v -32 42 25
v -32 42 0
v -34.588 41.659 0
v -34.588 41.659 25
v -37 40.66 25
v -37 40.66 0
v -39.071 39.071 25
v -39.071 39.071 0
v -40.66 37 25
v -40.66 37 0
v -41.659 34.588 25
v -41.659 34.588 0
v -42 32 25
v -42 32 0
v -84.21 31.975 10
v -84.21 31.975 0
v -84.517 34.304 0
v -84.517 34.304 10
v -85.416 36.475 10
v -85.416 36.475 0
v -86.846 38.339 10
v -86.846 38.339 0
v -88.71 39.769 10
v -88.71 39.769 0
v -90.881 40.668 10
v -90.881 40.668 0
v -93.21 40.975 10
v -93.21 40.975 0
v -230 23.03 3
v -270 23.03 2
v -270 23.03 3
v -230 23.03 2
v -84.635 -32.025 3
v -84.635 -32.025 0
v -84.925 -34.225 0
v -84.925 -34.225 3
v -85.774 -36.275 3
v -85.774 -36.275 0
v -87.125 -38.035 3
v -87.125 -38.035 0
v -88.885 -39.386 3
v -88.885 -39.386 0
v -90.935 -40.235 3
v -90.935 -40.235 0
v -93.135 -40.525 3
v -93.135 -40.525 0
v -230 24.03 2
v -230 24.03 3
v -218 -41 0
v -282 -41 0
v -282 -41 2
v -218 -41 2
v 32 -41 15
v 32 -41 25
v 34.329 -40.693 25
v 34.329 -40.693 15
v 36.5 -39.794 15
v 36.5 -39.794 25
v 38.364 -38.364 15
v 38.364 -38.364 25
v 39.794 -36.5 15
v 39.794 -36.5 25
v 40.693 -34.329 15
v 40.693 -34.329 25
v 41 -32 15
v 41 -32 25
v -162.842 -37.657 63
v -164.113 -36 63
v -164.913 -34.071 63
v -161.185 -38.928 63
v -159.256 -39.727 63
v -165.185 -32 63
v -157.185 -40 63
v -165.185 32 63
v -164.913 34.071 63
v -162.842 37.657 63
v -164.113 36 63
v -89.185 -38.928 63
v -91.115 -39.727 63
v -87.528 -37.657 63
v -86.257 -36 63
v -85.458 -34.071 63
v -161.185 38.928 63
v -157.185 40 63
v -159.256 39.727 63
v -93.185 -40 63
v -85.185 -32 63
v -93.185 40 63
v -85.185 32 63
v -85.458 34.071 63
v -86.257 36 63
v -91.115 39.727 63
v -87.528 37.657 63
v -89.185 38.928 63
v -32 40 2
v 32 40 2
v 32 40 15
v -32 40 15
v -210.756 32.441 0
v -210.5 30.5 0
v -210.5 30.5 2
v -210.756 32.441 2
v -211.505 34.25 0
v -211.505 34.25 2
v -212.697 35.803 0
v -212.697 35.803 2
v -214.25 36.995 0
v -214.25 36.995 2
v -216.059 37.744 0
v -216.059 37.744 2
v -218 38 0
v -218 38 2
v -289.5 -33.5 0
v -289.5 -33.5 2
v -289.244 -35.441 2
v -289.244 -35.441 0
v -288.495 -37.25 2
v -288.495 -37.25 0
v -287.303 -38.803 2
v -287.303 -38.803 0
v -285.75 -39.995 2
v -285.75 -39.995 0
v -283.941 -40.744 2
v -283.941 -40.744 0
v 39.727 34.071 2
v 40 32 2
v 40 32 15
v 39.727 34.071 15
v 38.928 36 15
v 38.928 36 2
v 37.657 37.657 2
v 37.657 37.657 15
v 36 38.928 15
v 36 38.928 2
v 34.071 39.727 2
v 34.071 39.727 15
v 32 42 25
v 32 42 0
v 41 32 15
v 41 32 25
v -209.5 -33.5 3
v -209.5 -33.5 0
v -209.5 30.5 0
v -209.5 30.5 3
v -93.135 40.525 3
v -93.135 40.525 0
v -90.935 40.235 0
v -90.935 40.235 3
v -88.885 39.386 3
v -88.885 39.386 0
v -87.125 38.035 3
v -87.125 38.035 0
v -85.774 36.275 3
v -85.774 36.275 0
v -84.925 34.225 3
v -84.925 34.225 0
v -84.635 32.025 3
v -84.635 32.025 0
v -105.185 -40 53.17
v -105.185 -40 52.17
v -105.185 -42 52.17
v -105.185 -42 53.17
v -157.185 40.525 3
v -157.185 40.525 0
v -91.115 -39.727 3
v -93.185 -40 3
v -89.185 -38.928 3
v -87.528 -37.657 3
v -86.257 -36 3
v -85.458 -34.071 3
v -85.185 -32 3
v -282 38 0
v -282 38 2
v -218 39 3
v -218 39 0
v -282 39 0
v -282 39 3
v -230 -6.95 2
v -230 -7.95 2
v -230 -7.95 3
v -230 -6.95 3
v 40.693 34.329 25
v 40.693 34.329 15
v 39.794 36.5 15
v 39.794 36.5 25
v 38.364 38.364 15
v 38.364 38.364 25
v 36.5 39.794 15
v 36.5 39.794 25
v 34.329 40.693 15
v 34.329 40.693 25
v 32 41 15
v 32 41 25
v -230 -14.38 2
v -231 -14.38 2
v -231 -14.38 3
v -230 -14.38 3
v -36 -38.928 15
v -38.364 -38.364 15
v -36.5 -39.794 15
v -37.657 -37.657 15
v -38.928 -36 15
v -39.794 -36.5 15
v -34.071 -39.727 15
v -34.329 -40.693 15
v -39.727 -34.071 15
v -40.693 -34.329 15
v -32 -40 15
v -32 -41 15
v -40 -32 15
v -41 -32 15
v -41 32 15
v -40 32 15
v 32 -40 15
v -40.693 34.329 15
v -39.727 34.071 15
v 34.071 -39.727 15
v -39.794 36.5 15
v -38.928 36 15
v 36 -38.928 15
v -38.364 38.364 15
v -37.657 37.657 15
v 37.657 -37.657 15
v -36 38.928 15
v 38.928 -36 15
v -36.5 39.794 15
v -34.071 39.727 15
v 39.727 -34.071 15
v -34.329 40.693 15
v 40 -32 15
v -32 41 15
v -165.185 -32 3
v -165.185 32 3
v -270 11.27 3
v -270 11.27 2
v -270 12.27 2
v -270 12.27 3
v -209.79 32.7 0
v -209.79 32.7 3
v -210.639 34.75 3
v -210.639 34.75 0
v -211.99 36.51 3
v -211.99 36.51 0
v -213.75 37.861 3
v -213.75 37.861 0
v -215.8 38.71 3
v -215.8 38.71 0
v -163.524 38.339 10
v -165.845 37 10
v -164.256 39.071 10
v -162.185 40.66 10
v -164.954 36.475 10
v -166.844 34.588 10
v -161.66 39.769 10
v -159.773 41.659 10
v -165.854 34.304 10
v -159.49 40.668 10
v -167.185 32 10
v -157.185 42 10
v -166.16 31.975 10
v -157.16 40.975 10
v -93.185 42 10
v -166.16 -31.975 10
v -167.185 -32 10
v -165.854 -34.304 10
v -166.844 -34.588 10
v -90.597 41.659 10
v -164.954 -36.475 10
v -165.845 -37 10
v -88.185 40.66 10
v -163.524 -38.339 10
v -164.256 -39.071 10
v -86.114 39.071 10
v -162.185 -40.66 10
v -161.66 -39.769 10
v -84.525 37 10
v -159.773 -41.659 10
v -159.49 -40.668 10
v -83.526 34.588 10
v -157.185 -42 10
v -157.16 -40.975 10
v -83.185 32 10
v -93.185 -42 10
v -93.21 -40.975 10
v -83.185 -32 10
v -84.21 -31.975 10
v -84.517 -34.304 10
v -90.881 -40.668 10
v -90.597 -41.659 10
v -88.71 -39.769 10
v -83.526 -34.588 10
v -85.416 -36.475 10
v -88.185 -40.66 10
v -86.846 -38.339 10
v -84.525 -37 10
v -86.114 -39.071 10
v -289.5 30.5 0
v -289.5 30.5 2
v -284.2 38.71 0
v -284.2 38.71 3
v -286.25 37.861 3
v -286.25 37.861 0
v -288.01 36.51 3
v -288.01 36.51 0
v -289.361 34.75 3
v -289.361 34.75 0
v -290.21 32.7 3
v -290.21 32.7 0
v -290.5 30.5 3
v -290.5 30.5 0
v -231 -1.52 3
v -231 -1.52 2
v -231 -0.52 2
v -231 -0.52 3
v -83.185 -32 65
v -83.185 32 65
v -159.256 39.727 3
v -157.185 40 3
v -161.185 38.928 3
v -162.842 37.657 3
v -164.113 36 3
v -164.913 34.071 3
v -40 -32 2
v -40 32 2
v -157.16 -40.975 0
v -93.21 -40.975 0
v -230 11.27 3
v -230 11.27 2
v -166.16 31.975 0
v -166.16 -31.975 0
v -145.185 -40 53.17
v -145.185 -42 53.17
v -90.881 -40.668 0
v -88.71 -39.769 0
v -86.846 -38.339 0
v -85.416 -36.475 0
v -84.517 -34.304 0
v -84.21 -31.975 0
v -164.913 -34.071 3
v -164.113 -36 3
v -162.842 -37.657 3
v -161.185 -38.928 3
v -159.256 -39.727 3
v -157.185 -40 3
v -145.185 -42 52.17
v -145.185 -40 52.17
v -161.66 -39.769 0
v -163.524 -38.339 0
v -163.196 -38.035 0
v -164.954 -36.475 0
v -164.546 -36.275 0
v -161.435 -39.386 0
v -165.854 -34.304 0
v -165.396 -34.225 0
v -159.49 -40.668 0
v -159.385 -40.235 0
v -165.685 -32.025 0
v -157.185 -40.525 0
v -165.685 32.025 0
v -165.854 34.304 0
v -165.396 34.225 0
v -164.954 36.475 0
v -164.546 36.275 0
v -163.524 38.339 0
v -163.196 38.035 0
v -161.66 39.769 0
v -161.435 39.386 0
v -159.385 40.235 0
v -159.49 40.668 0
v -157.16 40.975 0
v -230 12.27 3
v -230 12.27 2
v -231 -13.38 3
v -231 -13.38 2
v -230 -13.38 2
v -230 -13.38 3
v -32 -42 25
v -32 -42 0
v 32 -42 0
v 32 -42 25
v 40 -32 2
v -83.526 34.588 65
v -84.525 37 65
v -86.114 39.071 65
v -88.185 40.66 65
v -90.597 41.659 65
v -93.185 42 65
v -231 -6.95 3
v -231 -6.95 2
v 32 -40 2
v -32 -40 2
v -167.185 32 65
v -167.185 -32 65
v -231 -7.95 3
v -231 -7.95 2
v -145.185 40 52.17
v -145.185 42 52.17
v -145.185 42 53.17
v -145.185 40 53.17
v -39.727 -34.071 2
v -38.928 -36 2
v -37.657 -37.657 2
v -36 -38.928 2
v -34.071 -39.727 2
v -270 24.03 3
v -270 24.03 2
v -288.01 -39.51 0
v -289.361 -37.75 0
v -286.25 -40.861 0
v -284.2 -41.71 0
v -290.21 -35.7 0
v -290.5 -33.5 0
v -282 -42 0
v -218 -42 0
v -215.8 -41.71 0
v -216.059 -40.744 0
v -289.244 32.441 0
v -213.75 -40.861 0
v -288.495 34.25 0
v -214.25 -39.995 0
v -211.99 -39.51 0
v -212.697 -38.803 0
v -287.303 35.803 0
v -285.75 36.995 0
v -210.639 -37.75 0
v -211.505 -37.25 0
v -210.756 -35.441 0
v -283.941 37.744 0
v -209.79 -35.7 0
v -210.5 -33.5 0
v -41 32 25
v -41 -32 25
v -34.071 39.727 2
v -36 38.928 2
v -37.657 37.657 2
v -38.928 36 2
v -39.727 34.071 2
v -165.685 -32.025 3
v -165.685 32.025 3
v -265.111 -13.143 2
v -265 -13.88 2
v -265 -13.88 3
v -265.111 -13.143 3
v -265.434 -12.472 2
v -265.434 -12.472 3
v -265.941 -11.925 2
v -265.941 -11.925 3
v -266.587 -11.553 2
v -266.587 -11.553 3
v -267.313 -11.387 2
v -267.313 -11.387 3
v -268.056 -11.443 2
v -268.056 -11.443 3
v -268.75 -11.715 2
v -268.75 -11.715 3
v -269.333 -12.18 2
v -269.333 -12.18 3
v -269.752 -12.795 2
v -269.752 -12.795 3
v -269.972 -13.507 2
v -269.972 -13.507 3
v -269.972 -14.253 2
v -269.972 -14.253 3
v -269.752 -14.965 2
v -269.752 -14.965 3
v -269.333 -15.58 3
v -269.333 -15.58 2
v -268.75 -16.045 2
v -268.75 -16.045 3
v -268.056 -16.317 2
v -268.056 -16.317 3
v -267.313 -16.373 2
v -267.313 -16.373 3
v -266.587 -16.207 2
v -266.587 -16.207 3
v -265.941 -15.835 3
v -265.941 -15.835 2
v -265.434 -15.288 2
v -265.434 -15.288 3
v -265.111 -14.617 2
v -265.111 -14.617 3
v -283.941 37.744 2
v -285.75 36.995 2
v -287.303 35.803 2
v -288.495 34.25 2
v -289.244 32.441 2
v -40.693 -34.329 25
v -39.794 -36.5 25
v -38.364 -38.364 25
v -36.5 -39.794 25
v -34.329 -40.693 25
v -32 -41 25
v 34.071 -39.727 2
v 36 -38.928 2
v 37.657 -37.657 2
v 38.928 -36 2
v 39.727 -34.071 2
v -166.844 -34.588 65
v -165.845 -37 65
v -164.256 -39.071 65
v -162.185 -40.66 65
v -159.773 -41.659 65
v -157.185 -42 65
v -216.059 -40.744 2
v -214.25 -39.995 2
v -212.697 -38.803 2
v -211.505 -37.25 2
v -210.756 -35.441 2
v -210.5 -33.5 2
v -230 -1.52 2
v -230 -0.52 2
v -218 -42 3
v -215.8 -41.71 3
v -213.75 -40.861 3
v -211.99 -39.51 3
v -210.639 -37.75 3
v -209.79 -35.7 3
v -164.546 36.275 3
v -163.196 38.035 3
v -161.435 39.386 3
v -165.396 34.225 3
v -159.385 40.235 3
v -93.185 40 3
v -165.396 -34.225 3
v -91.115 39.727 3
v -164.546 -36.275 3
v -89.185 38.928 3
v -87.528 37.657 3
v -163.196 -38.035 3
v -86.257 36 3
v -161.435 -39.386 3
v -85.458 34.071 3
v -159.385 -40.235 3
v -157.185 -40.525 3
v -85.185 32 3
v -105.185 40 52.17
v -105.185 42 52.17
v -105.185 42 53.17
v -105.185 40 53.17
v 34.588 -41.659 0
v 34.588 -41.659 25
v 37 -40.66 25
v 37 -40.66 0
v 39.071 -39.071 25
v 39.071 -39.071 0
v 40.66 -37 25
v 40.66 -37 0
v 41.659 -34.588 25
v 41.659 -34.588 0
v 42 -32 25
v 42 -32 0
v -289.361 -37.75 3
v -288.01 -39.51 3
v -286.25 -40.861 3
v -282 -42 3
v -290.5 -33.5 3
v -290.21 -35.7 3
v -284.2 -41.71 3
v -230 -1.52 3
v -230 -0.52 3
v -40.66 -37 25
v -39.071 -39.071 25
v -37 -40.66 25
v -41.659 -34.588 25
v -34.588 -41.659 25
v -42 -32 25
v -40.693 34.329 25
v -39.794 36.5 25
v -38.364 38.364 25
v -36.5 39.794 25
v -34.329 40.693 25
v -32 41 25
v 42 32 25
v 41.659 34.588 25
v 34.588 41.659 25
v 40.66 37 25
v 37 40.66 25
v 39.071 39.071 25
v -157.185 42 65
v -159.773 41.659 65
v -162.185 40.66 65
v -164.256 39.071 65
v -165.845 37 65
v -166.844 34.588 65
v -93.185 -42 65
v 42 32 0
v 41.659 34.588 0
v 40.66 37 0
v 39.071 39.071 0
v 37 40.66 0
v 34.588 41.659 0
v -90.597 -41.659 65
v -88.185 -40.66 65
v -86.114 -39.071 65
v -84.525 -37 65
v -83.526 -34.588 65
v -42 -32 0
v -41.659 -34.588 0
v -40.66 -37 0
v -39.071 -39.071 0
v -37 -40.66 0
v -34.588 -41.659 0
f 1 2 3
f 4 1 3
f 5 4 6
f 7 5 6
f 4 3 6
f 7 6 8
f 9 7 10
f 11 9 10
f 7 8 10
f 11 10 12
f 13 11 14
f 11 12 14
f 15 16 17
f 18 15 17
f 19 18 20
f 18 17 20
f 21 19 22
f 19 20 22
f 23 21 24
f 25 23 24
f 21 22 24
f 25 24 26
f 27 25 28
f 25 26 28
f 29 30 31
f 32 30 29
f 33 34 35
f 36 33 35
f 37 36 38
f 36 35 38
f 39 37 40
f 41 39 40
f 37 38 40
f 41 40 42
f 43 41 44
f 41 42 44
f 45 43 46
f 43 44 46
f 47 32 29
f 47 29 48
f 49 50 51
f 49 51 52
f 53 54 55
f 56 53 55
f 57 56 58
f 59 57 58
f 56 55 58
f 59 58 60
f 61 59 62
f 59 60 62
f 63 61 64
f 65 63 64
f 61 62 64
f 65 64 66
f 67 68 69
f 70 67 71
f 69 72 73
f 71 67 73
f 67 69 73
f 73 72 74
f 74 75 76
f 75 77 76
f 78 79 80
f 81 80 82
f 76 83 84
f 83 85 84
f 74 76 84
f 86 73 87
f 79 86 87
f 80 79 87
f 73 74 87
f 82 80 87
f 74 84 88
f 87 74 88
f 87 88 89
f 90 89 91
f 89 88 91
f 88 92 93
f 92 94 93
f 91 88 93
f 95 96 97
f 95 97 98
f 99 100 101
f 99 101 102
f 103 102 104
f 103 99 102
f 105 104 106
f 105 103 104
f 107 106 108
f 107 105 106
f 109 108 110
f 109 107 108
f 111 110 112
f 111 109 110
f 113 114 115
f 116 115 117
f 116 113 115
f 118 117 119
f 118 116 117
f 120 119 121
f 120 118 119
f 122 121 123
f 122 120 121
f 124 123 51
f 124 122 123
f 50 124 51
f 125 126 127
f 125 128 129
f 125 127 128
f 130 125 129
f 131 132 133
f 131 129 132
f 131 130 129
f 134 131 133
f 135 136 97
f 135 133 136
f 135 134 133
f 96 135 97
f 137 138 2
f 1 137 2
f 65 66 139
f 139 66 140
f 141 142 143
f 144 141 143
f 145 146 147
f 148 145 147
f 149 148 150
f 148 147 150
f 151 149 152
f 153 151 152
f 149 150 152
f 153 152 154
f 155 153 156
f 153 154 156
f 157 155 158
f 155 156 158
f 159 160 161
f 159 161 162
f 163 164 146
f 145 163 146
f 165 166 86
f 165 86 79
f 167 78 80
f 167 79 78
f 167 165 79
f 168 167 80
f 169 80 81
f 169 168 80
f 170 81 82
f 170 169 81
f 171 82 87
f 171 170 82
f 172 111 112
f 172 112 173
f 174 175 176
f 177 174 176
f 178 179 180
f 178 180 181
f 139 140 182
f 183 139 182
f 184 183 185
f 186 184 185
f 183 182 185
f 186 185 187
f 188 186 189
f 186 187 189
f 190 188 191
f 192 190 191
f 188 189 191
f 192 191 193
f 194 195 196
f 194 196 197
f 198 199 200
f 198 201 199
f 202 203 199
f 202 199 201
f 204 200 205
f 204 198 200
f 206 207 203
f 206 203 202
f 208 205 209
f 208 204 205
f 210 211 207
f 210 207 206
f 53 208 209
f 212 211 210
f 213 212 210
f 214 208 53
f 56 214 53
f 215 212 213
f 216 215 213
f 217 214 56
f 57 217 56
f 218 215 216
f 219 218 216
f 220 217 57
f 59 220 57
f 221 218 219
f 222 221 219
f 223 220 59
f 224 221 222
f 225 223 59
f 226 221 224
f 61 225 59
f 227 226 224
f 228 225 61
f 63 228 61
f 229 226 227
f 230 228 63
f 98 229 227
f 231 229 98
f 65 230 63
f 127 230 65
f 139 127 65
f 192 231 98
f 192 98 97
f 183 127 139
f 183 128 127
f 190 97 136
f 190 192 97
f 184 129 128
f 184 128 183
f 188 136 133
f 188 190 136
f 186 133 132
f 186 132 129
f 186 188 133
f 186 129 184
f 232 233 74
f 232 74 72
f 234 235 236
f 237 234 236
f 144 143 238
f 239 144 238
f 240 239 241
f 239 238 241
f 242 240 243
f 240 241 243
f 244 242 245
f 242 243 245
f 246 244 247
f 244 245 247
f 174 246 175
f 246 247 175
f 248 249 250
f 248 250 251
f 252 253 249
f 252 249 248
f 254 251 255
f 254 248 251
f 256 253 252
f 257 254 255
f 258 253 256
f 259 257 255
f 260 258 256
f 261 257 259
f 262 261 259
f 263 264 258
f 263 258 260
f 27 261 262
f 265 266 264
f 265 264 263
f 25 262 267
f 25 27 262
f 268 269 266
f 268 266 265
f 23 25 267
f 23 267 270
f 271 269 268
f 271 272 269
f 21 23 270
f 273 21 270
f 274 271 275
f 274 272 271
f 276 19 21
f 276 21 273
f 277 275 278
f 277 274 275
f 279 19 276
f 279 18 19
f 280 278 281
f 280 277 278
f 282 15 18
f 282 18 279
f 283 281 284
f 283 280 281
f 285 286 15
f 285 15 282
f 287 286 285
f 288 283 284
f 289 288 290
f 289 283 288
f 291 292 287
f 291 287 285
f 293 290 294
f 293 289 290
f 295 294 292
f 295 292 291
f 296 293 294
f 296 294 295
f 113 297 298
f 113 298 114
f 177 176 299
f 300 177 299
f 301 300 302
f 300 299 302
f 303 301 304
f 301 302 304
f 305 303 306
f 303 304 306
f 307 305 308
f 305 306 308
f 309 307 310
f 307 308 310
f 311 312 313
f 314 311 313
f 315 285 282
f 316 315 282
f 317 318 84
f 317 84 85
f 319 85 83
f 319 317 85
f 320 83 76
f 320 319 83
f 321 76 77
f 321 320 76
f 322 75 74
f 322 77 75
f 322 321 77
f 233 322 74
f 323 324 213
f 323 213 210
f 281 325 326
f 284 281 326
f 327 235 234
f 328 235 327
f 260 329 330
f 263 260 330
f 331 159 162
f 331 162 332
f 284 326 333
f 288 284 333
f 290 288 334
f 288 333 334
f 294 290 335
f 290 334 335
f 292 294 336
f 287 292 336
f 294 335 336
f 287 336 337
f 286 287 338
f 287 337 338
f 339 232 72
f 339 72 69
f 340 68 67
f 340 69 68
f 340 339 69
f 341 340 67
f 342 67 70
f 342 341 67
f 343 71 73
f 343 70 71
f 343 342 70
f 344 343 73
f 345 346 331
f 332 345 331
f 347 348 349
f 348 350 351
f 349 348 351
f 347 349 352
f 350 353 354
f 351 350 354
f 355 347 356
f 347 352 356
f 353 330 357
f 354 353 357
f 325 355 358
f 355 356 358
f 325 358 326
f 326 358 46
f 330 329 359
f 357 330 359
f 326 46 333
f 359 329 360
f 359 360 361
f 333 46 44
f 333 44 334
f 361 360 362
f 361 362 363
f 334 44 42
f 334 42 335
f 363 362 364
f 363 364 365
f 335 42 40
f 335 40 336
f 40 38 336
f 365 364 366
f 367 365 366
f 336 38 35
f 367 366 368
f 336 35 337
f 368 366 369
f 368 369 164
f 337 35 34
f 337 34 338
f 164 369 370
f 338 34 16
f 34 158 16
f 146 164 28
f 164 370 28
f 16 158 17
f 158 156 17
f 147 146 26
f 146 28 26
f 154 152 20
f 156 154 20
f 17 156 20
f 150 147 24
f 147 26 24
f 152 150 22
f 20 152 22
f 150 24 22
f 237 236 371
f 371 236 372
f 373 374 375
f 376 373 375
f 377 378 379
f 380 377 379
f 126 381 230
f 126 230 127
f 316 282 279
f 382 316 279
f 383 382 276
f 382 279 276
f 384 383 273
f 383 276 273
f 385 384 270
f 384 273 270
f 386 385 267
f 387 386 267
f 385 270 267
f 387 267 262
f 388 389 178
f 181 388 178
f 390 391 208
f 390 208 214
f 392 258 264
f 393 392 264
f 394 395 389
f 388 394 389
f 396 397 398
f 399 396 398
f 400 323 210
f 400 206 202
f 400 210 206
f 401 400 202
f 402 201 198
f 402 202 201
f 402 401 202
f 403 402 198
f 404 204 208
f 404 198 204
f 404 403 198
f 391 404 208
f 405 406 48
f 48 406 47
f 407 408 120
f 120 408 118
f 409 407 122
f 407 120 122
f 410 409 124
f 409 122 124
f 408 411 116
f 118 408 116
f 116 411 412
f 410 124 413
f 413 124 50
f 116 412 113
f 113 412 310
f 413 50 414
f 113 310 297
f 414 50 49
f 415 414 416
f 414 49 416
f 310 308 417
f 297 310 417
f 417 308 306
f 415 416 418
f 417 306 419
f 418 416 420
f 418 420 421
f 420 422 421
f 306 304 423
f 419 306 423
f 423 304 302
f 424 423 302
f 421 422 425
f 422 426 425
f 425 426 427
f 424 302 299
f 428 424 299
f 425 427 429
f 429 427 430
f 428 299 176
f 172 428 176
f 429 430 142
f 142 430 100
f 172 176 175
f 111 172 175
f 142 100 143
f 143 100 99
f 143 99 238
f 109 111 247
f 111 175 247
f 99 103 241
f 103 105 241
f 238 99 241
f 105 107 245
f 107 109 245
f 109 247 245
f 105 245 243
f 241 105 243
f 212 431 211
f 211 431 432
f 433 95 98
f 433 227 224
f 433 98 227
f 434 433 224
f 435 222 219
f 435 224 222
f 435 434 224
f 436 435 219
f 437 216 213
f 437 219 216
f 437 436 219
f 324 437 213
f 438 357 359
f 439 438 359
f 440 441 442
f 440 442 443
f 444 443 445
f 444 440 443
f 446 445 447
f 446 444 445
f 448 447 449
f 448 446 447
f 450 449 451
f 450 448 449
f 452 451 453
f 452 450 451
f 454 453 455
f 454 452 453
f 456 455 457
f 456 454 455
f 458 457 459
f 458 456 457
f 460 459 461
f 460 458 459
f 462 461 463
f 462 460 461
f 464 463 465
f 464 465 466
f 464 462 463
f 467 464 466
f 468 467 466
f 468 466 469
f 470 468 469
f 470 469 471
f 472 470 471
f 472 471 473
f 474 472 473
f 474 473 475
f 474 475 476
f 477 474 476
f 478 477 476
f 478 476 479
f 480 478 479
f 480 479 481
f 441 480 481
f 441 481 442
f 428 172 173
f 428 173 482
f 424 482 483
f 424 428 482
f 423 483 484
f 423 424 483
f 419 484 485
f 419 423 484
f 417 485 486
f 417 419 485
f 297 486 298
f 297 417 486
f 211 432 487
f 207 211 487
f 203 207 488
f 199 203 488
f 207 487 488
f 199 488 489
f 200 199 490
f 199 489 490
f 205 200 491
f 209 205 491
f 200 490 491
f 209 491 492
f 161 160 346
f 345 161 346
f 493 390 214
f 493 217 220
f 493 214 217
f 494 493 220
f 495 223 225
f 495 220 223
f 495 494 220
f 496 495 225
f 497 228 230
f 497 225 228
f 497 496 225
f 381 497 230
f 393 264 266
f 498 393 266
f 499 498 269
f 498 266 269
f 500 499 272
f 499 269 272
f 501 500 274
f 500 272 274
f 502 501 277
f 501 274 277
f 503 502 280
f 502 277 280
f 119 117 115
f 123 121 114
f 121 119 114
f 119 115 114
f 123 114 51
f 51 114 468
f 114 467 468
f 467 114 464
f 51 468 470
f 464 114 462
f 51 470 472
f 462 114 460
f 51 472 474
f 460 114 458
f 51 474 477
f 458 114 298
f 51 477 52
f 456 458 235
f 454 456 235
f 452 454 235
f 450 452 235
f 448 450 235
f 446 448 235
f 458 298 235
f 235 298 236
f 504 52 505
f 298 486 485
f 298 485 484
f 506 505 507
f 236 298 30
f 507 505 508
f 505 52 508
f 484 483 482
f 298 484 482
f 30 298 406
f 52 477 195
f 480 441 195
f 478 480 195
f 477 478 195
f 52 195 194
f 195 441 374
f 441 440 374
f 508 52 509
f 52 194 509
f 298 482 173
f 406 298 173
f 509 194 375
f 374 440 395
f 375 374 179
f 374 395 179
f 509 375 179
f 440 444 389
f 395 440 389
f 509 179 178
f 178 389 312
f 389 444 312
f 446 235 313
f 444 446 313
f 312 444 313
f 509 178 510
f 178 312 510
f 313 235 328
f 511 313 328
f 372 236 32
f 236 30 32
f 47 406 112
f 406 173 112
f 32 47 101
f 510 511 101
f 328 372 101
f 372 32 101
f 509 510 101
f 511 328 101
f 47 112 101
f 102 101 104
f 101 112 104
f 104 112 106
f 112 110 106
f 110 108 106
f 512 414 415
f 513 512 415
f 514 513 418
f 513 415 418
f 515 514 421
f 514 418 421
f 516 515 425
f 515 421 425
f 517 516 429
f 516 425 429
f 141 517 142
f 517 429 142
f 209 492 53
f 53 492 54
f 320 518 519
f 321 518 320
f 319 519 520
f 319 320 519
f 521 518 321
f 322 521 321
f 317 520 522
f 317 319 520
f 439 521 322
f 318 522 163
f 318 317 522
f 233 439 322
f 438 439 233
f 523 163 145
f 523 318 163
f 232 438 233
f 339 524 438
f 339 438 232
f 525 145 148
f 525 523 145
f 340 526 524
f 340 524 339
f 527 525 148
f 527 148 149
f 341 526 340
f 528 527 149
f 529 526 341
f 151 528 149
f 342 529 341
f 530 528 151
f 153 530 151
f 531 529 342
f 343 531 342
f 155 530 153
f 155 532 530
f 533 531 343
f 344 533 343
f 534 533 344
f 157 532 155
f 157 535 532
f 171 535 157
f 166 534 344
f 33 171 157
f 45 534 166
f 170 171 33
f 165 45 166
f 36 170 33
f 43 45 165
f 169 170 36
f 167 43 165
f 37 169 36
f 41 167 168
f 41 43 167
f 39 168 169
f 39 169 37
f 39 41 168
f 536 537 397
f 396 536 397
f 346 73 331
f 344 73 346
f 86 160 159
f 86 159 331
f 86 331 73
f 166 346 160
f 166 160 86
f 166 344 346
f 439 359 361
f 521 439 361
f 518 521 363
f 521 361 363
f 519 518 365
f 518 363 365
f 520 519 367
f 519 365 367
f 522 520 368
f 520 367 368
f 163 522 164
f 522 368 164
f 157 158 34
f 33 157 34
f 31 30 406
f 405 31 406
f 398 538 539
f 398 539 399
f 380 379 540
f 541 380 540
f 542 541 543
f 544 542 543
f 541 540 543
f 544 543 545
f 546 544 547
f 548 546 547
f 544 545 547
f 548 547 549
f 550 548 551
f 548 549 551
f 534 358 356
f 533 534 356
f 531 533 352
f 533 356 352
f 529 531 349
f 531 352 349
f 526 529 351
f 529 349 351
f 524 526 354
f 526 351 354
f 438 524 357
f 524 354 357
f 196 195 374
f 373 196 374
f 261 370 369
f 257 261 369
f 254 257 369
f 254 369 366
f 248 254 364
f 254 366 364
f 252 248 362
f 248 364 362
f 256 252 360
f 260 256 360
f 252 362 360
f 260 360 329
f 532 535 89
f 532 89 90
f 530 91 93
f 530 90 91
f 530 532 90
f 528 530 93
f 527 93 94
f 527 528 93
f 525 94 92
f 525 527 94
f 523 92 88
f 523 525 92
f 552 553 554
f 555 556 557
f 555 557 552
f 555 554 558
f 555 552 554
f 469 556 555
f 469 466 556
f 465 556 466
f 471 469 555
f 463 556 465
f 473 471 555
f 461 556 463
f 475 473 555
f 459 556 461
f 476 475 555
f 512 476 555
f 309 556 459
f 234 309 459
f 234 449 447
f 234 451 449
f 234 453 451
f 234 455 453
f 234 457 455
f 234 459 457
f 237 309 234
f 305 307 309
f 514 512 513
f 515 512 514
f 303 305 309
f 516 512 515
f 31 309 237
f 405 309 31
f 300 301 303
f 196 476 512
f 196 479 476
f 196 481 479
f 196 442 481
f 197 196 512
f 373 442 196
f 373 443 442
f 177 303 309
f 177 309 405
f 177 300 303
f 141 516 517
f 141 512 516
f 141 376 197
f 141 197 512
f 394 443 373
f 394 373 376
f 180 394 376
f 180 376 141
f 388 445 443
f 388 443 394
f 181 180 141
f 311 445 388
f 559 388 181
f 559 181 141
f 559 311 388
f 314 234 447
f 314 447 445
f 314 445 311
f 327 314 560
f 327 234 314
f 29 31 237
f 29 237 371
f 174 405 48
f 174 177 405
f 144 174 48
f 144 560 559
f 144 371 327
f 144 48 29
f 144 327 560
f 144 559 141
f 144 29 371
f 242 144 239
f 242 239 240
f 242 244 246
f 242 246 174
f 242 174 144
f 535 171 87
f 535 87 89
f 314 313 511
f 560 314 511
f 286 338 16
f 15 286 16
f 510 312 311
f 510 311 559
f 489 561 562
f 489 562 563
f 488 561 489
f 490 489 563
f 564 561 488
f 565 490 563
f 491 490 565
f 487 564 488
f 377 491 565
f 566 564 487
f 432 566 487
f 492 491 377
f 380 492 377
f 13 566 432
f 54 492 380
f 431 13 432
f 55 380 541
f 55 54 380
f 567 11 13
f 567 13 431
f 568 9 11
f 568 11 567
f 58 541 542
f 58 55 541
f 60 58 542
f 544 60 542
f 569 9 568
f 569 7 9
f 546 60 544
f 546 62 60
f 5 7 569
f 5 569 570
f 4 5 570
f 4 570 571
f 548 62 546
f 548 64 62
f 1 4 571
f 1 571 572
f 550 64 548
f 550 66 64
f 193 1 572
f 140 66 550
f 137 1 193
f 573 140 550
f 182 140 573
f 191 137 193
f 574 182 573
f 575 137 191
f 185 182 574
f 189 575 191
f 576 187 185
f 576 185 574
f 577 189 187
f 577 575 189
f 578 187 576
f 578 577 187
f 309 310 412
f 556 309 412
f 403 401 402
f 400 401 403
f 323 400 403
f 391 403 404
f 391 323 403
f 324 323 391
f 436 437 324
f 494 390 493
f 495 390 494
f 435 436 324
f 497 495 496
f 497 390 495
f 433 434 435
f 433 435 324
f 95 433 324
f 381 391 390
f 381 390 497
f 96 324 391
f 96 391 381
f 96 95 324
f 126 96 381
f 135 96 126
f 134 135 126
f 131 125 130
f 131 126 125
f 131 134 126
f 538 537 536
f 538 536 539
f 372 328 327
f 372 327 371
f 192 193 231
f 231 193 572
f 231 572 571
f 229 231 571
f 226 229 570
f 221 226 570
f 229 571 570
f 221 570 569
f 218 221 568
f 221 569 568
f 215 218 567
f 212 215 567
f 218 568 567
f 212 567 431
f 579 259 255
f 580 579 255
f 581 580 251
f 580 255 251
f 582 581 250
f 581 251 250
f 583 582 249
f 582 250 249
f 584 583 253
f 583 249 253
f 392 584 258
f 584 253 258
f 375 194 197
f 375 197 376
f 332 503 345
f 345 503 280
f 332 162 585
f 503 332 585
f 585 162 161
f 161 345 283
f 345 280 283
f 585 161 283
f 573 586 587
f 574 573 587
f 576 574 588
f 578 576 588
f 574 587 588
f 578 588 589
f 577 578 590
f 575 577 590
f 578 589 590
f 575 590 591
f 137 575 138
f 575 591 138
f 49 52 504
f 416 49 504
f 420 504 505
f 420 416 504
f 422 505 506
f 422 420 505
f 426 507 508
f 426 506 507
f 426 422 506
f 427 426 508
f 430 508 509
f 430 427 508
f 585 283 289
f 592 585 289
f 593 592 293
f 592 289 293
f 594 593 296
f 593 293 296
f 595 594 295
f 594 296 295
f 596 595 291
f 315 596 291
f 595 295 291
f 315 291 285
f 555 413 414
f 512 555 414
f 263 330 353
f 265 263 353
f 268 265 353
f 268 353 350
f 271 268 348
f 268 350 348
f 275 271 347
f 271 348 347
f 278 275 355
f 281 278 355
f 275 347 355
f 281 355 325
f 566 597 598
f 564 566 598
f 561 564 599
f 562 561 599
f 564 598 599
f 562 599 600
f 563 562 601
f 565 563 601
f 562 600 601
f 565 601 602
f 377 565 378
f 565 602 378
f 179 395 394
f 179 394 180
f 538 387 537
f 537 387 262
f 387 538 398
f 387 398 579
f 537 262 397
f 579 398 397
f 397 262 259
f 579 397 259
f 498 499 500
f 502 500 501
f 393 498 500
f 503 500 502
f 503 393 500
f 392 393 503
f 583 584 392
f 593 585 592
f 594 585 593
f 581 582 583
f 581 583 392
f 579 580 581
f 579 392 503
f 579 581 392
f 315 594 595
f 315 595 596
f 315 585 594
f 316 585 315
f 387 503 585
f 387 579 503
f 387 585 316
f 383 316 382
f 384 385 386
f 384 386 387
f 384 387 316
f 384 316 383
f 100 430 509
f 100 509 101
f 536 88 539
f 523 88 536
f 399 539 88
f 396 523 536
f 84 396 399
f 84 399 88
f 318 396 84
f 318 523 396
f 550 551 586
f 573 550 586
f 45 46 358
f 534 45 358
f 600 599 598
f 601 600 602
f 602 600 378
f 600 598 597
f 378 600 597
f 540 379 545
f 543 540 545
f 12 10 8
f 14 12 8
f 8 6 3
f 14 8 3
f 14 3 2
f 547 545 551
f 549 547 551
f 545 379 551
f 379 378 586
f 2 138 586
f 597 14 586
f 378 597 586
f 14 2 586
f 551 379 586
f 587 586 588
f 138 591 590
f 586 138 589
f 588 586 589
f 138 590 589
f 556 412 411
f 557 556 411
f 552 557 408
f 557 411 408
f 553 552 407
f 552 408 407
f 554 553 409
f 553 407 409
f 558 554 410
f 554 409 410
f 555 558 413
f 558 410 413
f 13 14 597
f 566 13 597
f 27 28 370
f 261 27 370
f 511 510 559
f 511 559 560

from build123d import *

# Parameters (mm, degrees)
F1_DEPTH  = 25
F2_T      = -2
F4_DEPTH  = 10
F6_DEPTH  = 65
F7_T      = -2
F8_W      = 91.175536
F8_H      = 98.510154
F9_DEPTH  = 10
F11_DEPTH = 3
F12_R     = 2.5
F12_W     = 1
F12_H     = 1
F12_W_2   = 40
F13_DEPTH = 3
F14_W     = 40
F14_H     = 1
F15_DEPTH = 84.001
F16_T     = -1
F17_W     = 56.260198
F17_H     = 52.576504
F18_DEPTH = 25


with BuildPart() as f1:
    # F0 (on Top) → F1 (new body)
    with BuildSketch(Plane.XY):
        with BuildLine():
            ThreePointArc((-42, -32), (-39.071068, -39.071068), (-32, -42))
            Line((-32, -42), (32, -42))
            ThreePointArc((32, -42), (39.071068, -39.071068), (42, -32))
            Line((42, -32), (42, 32))
            ThreePointArc((42, 32), (39.071068, 39.071068), (32, 42))
            Line((32, 42), (-32, 42))
            ThreePointArc((-32, 42), (-39.071068, 39.071068), (-42, 32))
            Line((-42, 32), (-42, -32))
        make_face()
    extrude(amount=F1_DEPTH)

    # F2
    f2_openings = [f1.faces().sort_by_distance(p)[0] for p in [
        (0, 0, 25),
    ]]
    offset(amount=F2_T, openings=f2_openings)

    # F3 (on face) → F4 (cut)
    with BuildSketch(Plane.XY.offset(25)):
        with BuildLine():
            Line((32, 41), (-32, 41))
            ThreePointArc((-32, 41), (-38.363961, 38.363961), (-41, 32))
            Line((-41, 32), (-41, -32))
            ThreePointArc((-41, -32), (-38.363961, -38.363961), (-32, -41))
            Line((-32, -41), (32, -41))
            ThreePointArc((32, -41), (38.363961, -38.363961), (41, -32))
            Line((41, -32), (41, 32))
            ThreePointArc((41, 32), (38.363961, 38.363961), (32, 41))
        make_face()
    extrude(amount=-F4_DEPTH, mode=Mode.SUBTRACT)


with BuildPart() as f6:
    # F5 (on Top) → F6 (new body)
    with BuildSketch(Plane.XY):
        with BuildLine():
            Line((-157.185187, -42), (-93.185187, -42))
            ThreePointArc((-93.185187, -42), (-86.114119, -39.071068), (-83.185187, -32))
            Line((-83.185187, -32), (-83.185187, 32))
            ThreePointArc((-83.185187, 32), (-86.114119, 39.071068), (-93.185187, 42))
            Line((-93.185187, 42), (-157.185187, 42))
            ThreePointArc((-157.185187, 42), (-164.256255, 39.071068), (-167.185187, 32))
            Line((-167.185187, 32), (-167.185187, -32))
            ThreePointArc((-167.185187, -32), (-164.256255, -39.071068), (-157.185187, -42))
        make_face()
    extrude(amount=F6_DEPTH)

    # F7
    f7_openings = [f6.faces().sort_by_distance(p)[0] for p in [
        (-125.185187, 0, 0),
    ]]
    offset(amount=F7_T, openings=f7_openings)

    # F8 (on face) → F9 (cut)
    with BuildSketch(Plane(origin=(0, 0, 0), x_dir=(1, 0, 0), z_dir=(0, 0, -1))):
        with Locations((-125.185187, 0)):
            Rectangle(F8_W, F8_H)
        with BuildLine():
            ThreePointArc((-166.160187, 31.975), (-163.524148, 38.338961), (-157.160187, 40.975))
            Line((-157.160187, 40.975), (-93.210187, 40.975))
            ThreePointArc((-93.210187, 40.975), (-86.846226, 38.338961), (-84.210187, 31.975))
            Line((-84.210187, 31.975), (-84.210187, -31.975))
            ThreePointArc((-84.210187, -31.975), (-86.846226, -38.338961), (-93.210187, -40.975))
            Line((-93.210187, -40.975), (-157.160187, -40.975))
            ThreePointArc((-157.160187, -40.975), (-163.524148, -38.338961), (-166.160187, -31.975))
            Line((-166.160187, -31.975), (-166.160187, 31.975))
        make_face(mode=Mode.SUBTRACT)
    extrude(amount=-F9_DEPTH, mode=Mode.SUBTRACT)

    # F10 (on face) → F11 (cut)
    with BuildSketch(Plane(origin=(0, 0, 0), x_dir=(1, 0, 0), z_dir=(0, 0, -1))):
        with BuildLine():
            Line((-157.185187, -40.525), (-93.135187, -40.525))
            ThreePointArc((-93.135187, -40.525), (-87.12478, -38.035408), (-84.635187, -32.025))
            Line((-84.635187, -32.025), (-84.635187, 32.025))
            ThreePointArc((-84.635187, 32.025), (-87.12478, 38.035408), (-93.135187, 40.525))
            Line((-93.135187, 40.525), (-157.185187, 40.525))
            ThreePointArc((-157.185187, 40.525), (-163.195595, 38.035408), (-165.685187, 32.025))
            Line((-165.685187, 32.025), (-165.685187, -32.025))
            ThreePointArc((-165.685187, -32.025), (-163.195595, -38.035408), (-157.185187, -40.525))
        make_face()
    extrude(amount=-F11_DEPTH, mode=Mode.SUBTRACT)

    # F14 (on face) → F15 (cut, through all)
    with BuildSketch(Plane(origin=(0, 42, 0), x_dir=(-1, 0, 0), z_dir=(0, 1, 0))):
        with Locations((125.185187, 52.67)):
            Rectangle(F14_W, F14_H)
    extrude(amount=-F15_DEPTH, mode=Mode.SUBTRACT)


with BuildPart() as f13:
    # F12 (on Top) → F13 (new body)
    with BuildSketch(Plane.XY):
        with BuildLine():
            ThreePointArc((-290.5, -33.5), (-288.010408, -39.510408), (-282, -42))
            Line((-282, -42), (-218, -42))
            ThreePointArc((-218, -42), (-211.989592, -39.510408), (-209.5, -33.5))
            Line((-209.5, -33.5), (-209.5, 30.5))
            ThreePointArc((-209.5, 30.5), (-211.989592, 36.510408), (-218, 39))
            Line((-218, 39), (-282, 39))
            ThreePointArc((-282, 39), (-288.010408, 36.510408), (-290.5, 30.5))
            Line((-290.5, 30.5), (-290.5, -33.5))
        make_face()
        with Locations((-267.5, -13.88)):
            Circle(F12_R, mode=Mode.SUBTRACT)
        with Locations((-230.5, -13.88)):
            Rectangle(F12_W, F12_H, mode=Mode.SUBTRACT)
        with Locations((-230.5, -7.45)):
            Rectangle(F12_W, F12_H, mode=Mode.SUBTRACT)
        with Locations((-230.5, -1.02)):
            Rectangle(F12_W, F12_H, mode=Mode.SUBTRACT)
        with Locations((-250, 11.77)):
            Rectangle(F12_W_2, F12_H, mode=Mode.SUBTRACT)
        with Locations((-250, 23.53)):
            Rectangle(F12_W_2, F12_H, mode=Mode.SUBTRACT)
    extrude(amount=F13_DEPTH)

    # F16
    f16_openings = [f13.faces().sort_by_distance(p)[0] for p in [
        (-249.955426, -1.698718, 0),
    ]]
    offset(amount=F16_T, openings=f16_openings)

    # F17 (on face) → F18 (cut)
    with BuildSketch(Plane(origin=(0, 0, 2), x_dir=(1, 0, 0), z_dir=(0, 0, -1))):
        with Locations((-249.237731, -3.683705)):
            Rectangle(F17_W, F17_H)
    extrude(amount=F18_DEPTH, mode=Mode.SUBTRACT)


solid = Compound([f1.part, f6.part, f13.part])
